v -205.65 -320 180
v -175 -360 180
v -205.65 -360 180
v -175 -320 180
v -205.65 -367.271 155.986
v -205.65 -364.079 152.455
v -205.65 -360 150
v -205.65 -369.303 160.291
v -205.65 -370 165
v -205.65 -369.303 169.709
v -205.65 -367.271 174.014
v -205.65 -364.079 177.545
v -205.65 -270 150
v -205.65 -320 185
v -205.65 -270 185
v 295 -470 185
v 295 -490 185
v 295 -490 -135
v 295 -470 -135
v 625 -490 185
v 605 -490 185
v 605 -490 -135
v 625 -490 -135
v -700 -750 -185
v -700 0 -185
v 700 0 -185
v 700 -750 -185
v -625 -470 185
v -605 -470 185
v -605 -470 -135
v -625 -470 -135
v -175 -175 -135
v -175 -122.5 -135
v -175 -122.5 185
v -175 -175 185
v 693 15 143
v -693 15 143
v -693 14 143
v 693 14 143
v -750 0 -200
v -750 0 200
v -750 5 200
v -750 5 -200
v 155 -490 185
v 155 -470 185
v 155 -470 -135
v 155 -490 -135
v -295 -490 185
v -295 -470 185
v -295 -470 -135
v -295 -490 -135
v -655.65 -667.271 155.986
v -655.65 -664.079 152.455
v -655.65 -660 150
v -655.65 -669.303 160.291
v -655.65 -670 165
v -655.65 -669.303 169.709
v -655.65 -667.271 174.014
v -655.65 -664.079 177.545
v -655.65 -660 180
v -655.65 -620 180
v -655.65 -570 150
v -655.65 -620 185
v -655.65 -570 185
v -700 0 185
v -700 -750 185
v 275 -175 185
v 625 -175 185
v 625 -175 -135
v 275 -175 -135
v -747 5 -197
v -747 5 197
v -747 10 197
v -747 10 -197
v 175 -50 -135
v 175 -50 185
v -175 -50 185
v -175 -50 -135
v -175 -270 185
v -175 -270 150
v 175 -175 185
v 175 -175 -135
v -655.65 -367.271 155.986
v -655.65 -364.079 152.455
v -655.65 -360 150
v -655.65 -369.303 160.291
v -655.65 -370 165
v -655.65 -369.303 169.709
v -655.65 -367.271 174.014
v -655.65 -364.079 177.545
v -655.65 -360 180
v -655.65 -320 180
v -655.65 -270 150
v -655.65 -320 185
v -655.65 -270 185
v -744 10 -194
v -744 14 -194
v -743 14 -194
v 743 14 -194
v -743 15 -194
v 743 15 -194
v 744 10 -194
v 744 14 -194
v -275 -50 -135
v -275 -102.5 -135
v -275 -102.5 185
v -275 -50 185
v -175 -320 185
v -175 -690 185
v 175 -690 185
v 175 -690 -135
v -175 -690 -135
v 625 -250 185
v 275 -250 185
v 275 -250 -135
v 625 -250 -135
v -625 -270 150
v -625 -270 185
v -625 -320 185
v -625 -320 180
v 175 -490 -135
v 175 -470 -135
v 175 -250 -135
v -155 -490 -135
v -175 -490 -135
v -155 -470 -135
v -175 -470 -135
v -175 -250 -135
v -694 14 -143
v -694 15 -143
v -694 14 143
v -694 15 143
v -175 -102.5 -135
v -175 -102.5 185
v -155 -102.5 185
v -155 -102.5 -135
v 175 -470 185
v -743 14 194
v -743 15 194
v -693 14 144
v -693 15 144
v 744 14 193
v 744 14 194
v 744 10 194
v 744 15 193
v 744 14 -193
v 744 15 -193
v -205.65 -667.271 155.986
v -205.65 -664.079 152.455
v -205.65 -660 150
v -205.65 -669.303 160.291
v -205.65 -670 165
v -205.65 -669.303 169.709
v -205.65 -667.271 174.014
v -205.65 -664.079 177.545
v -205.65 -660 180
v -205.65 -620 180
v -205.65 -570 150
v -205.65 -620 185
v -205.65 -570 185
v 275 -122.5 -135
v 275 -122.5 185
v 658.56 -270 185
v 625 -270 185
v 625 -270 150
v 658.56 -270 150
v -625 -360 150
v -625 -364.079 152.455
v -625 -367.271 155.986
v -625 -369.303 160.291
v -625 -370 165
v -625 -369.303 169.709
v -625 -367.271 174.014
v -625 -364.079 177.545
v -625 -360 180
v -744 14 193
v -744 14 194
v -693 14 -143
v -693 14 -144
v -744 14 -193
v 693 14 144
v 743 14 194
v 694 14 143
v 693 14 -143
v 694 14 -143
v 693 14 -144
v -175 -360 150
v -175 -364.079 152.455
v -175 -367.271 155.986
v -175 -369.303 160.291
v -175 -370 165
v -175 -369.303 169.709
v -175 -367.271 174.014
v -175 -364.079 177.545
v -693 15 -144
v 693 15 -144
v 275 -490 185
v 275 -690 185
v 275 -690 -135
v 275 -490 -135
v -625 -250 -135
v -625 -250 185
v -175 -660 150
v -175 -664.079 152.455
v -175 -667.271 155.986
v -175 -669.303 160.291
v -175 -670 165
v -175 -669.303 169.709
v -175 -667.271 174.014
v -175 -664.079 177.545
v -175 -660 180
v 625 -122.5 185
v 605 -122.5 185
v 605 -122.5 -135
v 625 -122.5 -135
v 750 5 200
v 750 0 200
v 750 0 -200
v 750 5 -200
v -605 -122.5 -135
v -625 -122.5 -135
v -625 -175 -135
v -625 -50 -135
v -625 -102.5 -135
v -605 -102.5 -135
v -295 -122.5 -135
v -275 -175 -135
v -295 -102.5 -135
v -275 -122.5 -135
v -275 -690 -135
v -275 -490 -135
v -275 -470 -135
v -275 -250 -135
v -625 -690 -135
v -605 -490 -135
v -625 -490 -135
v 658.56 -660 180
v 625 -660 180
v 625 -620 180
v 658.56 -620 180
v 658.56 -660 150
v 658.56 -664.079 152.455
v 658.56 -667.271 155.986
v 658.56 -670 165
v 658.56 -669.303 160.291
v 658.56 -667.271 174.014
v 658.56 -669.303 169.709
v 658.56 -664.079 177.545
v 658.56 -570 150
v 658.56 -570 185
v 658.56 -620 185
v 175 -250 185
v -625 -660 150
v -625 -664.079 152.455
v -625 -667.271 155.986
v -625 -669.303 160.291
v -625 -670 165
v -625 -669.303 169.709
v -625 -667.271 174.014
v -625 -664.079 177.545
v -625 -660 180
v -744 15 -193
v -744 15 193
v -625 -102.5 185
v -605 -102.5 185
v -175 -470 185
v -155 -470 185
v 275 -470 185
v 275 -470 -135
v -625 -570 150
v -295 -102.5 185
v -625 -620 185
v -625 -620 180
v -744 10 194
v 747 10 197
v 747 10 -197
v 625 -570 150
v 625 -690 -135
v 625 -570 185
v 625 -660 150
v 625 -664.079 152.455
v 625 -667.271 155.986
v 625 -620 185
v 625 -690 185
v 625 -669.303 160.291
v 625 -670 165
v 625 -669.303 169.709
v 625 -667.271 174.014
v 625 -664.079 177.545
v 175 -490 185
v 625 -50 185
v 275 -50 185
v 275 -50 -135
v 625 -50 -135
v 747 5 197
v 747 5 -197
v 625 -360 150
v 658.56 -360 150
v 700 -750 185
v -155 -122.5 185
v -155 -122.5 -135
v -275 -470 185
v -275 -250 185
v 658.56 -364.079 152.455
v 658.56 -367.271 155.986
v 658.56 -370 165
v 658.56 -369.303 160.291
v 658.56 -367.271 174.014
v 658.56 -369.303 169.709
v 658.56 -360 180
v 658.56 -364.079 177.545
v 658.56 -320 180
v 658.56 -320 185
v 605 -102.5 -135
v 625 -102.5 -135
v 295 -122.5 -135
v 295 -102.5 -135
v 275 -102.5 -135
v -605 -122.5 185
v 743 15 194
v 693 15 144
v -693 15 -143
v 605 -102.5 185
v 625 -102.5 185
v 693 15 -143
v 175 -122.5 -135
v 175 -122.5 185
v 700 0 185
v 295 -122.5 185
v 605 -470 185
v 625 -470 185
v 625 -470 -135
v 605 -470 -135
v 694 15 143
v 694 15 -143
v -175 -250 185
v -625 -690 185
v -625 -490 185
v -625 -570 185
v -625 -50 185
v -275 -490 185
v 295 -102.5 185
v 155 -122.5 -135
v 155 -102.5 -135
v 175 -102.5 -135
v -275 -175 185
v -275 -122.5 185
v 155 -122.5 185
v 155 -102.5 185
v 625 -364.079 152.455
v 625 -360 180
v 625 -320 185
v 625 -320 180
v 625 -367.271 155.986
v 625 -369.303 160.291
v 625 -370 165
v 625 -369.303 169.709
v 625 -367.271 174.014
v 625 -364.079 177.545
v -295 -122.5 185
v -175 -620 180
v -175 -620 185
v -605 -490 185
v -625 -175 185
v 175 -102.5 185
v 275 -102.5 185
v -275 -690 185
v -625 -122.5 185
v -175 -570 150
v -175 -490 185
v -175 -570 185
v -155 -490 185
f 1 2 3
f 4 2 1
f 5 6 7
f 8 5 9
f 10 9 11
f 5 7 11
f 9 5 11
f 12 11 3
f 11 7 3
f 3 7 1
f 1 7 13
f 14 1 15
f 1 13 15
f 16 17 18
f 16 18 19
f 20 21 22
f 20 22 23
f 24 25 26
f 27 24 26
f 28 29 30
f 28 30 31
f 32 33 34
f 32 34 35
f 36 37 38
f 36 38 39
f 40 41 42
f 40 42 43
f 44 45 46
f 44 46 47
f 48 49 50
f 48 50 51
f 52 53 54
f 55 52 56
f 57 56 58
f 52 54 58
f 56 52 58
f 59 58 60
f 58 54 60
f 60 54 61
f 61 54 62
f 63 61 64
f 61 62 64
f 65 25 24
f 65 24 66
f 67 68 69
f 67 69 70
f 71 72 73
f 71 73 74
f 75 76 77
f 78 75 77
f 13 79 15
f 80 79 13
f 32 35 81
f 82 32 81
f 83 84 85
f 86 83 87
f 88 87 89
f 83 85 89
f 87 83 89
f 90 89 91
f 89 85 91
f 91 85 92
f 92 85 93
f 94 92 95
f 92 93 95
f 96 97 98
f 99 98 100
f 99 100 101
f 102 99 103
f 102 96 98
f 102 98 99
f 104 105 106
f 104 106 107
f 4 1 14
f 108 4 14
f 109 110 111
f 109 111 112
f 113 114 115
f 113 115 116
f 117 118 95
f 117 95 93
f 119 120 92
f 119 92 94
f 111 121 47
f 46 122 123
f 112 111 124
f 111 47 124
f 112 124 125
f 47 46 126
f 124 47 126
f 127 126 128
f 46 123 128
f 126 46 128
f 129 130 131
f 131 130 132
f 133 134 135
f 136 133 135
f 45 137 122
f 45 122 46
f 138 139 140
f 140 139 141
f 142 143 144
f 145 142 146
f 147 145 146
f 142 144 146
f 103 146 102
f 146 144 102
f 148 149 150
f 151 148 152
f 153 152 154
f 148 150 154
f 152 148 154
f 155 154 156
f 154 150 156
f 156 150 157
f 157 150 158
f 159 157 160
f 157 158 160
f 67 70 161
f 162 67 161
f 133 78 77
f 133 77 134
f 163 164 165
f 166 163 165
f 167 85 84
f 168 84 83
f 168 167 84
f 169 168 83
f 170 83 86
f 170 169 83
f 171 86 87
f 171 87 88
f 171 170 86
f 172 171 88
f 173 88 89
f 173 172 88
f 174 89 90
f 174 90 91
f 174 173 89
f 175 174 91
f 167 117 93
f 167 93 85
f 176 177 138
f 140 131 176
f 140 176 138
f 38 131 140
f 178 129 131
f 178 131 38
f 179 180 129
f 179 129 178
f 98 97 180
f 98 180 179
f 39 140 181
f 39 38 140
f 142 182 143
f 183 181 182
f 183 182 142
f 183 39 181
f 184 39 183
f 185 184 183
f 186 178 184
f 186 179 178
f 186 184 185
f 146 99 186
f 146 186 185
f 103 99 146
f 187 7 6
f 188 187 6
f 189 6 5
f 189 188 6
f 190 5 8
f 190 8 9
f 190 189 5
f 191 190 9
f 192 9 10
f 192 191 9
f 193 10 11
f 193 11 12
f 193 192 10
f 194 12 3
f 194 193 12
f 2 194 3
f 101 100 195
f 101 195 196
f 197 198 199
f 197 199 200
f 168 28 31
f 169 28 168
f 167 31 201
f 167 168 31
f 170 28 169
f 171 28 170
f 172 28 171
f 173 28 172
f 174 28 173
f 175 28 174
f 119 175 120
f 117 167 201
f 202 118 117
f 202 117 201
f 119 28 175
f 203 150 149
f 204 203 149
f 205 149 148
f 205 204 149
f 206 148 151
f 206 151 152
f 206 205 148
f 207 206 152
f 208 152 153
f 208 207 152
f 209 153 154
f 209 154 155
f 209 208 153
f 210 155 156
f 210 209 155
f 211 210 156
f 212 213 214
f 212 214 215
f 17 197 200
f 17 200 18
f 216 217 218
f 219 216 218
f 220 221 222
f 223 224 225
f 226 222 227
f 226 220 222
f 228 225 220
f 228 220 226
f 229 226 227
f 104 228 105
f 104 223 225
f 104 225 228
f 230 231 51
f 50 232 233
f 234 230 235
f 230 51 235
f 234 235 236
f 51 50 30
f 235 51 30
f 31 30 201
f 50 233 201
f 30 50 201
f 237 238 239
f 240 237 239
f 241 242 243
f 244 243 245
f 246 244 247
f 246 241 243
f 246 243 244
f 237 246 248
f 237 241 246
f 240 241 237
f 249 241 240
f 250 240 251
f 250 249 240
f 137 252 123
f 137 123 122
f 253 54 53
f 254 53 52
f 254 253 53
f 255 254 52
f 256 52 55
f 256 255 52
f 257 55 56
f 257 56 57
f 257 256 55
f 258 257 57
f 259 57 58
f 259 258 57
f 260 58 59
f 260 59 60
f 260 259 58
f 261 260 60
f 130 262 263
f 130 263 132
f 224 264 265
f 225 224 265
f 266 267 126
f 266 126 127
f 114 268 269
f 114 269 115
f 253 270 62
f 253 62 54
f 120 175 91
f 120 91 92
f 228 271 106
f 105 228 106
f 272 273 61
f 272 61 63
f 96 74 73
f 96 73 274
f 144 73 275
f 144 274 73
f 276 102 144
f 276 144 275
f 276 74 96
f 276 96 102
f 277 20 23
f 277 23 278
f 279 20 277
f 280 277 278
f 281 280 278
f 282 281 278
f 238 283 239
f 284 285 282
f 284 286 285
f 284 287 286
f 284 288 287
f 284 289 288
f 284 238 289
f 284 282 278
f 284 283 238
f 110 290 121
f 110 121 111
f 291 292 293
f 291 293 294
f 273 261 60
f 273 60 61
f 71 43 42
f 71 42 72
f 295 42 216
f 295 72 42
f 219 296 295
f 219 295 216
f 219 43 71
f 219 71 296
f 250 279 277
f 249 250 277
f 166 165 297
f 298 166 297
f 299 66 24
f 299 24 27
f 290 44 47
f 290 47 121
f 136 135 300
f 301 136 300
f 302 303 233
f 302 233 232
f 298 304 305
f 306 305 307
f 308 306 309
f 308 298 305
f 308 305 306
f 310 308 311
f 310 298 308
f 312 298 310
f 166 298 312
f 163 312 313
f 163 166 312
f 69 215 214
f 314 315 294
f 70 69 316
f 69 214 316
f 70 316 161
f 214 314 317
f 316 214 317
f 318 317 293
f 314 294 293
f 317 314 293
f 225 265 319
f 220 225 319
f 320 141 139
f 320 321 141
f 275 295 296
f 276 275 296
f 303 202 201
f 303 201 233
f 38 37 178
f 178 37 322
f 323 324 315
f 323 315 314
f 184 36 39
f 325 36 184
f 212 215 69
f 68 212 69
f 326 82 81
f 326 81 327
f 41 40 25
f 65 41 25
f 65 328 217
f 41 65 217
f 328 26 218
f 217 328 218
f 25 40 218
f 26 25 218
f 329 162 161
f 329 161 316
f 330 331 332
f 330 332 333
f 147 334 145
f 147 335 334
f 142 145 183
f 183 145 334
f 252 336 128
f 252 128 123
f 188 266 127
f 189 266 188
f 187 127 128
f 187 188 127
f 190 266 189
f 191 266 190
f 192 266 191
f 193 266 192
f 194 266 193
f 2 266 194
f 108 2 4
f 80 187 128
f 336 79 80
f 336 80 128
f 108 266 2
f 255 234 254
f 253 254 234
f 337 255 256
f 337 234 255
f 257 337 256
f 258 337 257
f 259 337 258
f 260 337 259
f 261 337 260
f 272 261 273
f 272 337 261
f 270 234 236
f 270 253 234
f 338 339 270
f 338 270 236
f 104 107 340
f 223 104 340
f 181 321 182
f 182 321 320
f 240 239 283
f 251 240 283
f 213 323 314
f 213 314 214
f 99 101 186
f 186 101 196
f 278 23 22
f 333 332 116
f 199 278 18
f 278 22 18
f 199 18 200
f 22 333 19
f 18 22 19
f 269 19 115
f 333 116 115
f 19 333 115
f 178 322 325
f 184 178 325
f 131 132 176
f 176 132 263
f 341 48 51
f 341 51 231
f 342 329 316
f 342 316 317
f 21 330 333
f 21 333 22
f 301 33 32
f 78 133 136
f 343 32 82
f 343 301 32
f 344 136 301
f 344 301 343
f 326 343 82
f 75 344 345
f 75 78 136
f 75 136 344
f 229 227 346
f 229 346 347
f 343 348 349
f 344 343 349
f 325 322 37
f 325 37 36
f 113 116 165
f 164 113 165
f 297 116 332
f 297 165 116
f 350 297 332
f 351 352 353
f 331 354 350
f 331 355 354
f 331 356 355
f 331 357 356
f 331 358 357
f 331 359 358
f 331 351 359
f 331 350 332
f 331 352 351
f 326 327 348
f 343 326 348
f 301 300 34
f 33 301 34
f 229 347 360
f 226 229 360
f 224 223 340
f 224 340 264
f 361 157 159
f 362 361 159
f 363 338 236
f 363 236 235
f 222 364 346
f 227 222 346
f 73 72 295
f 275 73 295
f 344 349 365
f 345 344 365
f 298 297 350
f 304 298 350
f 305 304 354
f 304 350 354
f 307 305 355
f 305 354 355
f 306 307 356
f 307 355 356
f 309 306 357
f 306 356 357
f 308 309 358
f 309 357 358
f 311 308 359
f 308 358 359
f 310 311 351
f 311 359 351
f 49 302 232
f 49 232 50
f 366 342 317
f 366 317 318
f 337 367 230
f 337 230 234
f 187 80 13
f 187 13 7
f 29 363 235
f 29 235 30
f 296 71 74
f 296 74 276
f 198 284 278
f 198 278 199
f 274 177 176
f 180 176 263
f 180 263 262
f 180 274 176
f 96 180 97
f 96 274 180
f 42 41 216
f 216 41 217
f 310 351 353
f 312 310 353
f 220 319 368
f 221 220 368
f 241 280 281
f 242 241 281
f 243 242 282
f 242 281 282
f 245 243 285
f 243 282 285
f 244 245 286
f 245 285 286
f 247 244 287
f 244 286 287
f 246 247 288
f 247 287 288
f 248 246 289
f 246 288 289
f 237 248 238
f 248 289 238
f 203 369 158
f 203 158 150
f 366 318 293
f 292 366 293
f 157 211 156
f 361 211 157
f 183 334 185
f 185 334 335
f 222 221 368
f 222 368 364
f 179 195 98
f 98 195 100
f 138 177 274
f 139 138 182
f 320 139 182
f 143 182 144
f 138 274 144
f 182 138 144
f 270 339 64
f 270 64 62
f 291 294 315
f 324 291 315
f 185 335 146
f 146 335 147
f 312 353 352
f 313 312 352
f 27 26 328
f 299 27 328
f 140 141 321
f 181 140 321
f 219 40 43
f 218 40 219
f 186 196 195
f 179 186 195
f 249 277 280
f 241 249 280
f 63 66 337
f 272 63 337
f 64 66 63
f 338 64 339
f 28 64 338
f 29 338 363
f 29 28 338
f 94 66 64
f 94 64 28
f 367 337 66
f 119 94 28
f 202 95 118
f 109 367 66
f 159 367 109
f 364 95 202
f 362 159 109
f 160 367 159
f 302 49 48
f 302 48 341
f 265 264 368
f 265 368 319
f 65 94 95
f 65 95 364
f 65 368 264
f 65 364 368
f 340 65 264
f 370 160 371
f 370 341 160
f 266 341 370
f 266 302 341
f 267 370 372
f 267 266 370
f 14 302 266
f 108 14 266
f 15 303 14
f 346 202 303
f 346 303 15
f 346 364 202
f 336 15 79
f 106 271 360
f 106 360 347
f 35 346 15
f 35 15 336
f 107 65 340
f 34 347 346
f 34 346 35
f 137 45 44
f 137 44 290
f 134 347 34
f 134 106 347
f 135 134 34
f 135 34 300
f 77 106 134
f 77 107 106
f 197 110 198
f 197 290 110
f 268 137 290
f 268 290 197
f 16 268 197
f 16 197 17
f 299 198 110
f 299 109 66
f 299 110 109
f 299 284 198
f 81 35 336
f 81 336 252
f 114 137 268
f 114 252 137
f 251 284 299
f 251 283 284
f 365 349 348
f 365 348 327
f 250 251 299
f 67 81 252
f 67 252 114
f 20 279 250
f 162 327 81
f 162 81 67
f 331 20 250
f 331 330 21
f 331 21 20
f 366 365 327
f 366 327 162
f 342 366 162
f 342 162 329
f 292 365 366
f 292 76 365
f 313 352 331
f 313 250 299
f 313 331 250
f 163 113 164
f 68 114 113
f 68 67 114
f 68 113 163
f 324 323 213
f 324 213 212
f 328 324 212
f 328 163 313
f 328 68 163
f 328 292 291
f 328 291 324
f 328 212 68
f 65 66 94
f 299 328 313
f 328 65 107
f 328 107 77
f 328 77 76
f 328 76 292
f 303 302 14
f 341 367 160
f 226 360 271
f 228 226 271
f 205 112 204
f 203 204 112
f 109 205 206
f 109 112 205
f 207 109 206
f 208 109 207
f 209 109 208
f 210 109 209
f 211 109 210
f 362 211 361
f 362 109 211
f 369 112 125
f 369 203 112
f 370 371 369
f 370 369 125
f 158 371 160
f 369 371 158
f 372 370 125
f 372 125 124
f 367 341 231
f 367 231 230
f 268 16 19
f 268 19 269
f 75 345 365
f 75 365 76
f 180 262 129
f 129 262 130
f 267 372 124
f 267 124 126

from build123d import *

# Parameters (mm, degrees)
SKETCH1_W           = 1500
SKETCH1_H           = 400
BOSS_EXTRUDE1_DEPTH = 5
SKETCH3_W           = 1494
SKETCH3_H           = 394
BOSS_EXTRUDE3_DEPTH = 5
SKETCH4_W           = 1488
SKETCH4_H           = 388
BOSS_EXTRUDE4_DEPTH = 5
SKETCH6_W           = 1386
SKETCH6_H           = 286
CUT_EXTRUDE1_DEPTH  = 1
SKETCH7_W           = 1400
SKETCH7_H           = 370
BOSS_EXTRUDE5_DEPTH = 750
CUT_EXTRUDE2_DEPTH  = 320
CUT_EXTRUDE3_DEPTH  = 30.65
CUT_EXTRUDE4_DEPTH  = 30.65
CUT_EXTRUDE6_DEPTH  = 33.56


with BuildPart() as part:
    # Sketch1 → Boss-Extrude1 (new body)
    with BuildSketch(Plane(origin=(0, 0, 0), x_dir=(1, 0, 0), z_dir=(0, 1, 0))):
        Rectangle(SKETCH1_W, SKETCH1_H)
    extrude(amount=BOSS_EXTRUDE1_DEPTH)

    # Sketch3 → Boss-Extrude3 (add)
    with BuildSketch(Plane(origin=(0, 5, 0), x_dir=(1, 0, 0), z_dir=(0, 1, 0))):
        Rectangle(SKETCH3_W, SKETCH3_H)
    extrude(amount=BOSS_EXTRUDE3_DEPTH)

    # Sketch4 → Boss-Extrude4 (add)
    with BuildSketch(Plane(origin=(0, 10, 0), x_dir=(1, 0, 0), z_dir=(0, 1, 0))):
        Rectangle(SKETCH4_W, SKETCH4_H)
    extrude(amount=BOSS_EXTRUDE4_DEPTH)

    # Sketch6 → Cut-Extrude1 (cut)
    with BuildSketch(Plane(origin=(0, 15, 0), x_dir=(1, 0, 0), z_dir=(0, 1, 0))):
        Polygon((744, 194), (743, 194), (693, 144), (-693, 144), (-743, 194), (-744, 194), (-744, 193), (-694, 143), (-694, -143), (-744, -193), (-744, -194), (-743, -194), (-693, -144), (693, -144), (743, -194), (744, -194), (744, -193), (694, -143), (694, 143), (744, 193), align=None)
        Rectangle(SKETCH6_W, SKETCH6_H, mode=Mode.SUBTRACT)
    extrude(amount=-CUT_EXTRUDE1_DEPTH, mode=Mode.SUBTRACT)

    # Sketch7 → Boss-Extrude5 (add)
    with BuildSketch(Plane.XZ):
        Rectangle(SKETCH7_W, SKETCH7_H)
    extrude(amount=BOSS_EXTRUDE5_DEPTH)

    # Sketch8 → Cut-Extrude2 (cut)
    with BuildSketch(Plane.XY.offset(185)):
        Polygon((-625, -250), (-275, -250), (-275, -470), (-295, -470), (-295, -490), (-275, -490), (-275, -690), (-625, -690), (-625, -490), (-605, -490), (-605, -470), (-625, -470), align=None)
        Polygon((-175, -250), (175, -250), (175, -470), (155, -470), (155, -490), (175, -490), (175, -690), (-175, -690), (-175, -490), (-155, -490), (-155, -470), (-175, -470), align=None)
        Polygon((275, -250), (625, -250), (625, -470), (605, -470), (605, -490), (625, -490), (625, -690), (275, -690), (275, -490), (295, -490), (295, -470), (275, -470), align=None)
        Polygon((-625, -175), (-275, -175), (-275, -122.5), (-295, -122.5), (-295, -102.5), (-275, -102.5), (-275, -50), (-625, -50), (-625, -102.5), (-605, -102.5), (-605, -122.5), (-625, -122.5), align=None)
        Polygon((-175, -175), (175, -175), (175, -122.5), (155, -122.5), (155, -102.5), (175, -102.5), (175, -50), (-175, -50), (-175, -102.5), (-155, -102.5), (-155, -122.5), (-175, -122.5), align=None)
        Polygon((275, -102.5), (275, -50), (625, -50), (625, -102.5), (605, -102.5), (605, -122.5), (625, -122.5), (625, -175), (275, -175), (275, -122.5), (295, -122.5), (295, -102.5), align=None)
    extrude(amount=-CUT_EXTRUDE2_DEPTH, mode=Mode.SUBTRACT)

    # Sketch9 → Cut-Extrude3 (cut)
    with BuildSketch(Plane(origin=(-625, 0, 0), x_dir=(0, 0, -1), z_dir=(1, 0, 0))):
        with BuildLine():
            Line((-150, -270), (-150, -360))
            ThreePointArc((-150, -360), (-165, -370), (-180, -360))
            Line((-180, -360), (-180, -320))
            Line((-180, -320), (-185, -320))
            Line((-185, -320), (-185, -270))
            Line((-185, -270), (-150, -270))
        make_face()
        with BuildLine():
            Line((-150, -570), (-150, -660))
            ThreePointArc((-150, -660), (-165, -670), (-180, -660))
            Line((-180, -660), (-180, -620))
            Line((-180, -620), (-185, -620))
            Line((-185, -620), (-185, -570))
            Line((-185, -570), (-150, -570))
        make_face()
    extrude(amount=-CUT_EXTRUDE3_DEPTH, mode=Mode.SUBTRACT)

    # Sketch10 → Cut-Extrude4 (cut)
    with BuildSketch(Plane(origin=(-175, 0, 0), x_dir=(0, 0, -1), z_dir=(1, 0, 0))):
        with BuildLine():
            Line((-150, -270), (-150, -360))
            ThreePointArc((-150, -360), (-165, -370), (-180, -360))
            Line((-180, -360), (-180, -320))
            Line((-180, -320), (-185, -320))
            Line((-185, -320), (-185, -270))
            Line((-185, -270), (-150, -270))
        make_face()
        with BuildLine():
            Line((-150, -570), (-150, -660))
            ThreePointArc((-150, -660), (-165, -670), (-180, -660))
            Line((-180, -660), (-180, -620))
            Line((-180, -620), (-185, -620))
            Line((-185, -620), (-185, -570))
            Line((-185, -570), (-150, -570))
        make_face()
    extrude(amount=-CUT_EXTRUDE4_DEPTH, mode=Mode.SUBTRACT)

    # Sketch12 → Cut-Extrude6 (cut)
    with BuildSketch(Plane.ZY.offset(-625)):
        with BuildLine():
            Line((150, -270), (150, -360))
            ThreePointArc((150, -360), (165, -370), (180, -360))
            Line((180, -360), (180, -320))
            Line((180, -320), (185, -320))
            Line((185, -320), (185, -270))
            Line((185, -270), (150, -270))
        make_face()
        with BuildLine():
            Line((150, -570), (150, -660))
            ThreePointArc((150, -660), (165, -670), (180, -660))
            Line((180, -660), (180, -620))
            Line((180, -620), (185, -620))
            Line((185, -620), (185, -570))
            Line((185, -570), (150, -570))
        make_face()
    extrude(amount=-CUT_EXTRUDE6_DEPTH, mode=Mode.SUBTRACT)


solid = part.part
